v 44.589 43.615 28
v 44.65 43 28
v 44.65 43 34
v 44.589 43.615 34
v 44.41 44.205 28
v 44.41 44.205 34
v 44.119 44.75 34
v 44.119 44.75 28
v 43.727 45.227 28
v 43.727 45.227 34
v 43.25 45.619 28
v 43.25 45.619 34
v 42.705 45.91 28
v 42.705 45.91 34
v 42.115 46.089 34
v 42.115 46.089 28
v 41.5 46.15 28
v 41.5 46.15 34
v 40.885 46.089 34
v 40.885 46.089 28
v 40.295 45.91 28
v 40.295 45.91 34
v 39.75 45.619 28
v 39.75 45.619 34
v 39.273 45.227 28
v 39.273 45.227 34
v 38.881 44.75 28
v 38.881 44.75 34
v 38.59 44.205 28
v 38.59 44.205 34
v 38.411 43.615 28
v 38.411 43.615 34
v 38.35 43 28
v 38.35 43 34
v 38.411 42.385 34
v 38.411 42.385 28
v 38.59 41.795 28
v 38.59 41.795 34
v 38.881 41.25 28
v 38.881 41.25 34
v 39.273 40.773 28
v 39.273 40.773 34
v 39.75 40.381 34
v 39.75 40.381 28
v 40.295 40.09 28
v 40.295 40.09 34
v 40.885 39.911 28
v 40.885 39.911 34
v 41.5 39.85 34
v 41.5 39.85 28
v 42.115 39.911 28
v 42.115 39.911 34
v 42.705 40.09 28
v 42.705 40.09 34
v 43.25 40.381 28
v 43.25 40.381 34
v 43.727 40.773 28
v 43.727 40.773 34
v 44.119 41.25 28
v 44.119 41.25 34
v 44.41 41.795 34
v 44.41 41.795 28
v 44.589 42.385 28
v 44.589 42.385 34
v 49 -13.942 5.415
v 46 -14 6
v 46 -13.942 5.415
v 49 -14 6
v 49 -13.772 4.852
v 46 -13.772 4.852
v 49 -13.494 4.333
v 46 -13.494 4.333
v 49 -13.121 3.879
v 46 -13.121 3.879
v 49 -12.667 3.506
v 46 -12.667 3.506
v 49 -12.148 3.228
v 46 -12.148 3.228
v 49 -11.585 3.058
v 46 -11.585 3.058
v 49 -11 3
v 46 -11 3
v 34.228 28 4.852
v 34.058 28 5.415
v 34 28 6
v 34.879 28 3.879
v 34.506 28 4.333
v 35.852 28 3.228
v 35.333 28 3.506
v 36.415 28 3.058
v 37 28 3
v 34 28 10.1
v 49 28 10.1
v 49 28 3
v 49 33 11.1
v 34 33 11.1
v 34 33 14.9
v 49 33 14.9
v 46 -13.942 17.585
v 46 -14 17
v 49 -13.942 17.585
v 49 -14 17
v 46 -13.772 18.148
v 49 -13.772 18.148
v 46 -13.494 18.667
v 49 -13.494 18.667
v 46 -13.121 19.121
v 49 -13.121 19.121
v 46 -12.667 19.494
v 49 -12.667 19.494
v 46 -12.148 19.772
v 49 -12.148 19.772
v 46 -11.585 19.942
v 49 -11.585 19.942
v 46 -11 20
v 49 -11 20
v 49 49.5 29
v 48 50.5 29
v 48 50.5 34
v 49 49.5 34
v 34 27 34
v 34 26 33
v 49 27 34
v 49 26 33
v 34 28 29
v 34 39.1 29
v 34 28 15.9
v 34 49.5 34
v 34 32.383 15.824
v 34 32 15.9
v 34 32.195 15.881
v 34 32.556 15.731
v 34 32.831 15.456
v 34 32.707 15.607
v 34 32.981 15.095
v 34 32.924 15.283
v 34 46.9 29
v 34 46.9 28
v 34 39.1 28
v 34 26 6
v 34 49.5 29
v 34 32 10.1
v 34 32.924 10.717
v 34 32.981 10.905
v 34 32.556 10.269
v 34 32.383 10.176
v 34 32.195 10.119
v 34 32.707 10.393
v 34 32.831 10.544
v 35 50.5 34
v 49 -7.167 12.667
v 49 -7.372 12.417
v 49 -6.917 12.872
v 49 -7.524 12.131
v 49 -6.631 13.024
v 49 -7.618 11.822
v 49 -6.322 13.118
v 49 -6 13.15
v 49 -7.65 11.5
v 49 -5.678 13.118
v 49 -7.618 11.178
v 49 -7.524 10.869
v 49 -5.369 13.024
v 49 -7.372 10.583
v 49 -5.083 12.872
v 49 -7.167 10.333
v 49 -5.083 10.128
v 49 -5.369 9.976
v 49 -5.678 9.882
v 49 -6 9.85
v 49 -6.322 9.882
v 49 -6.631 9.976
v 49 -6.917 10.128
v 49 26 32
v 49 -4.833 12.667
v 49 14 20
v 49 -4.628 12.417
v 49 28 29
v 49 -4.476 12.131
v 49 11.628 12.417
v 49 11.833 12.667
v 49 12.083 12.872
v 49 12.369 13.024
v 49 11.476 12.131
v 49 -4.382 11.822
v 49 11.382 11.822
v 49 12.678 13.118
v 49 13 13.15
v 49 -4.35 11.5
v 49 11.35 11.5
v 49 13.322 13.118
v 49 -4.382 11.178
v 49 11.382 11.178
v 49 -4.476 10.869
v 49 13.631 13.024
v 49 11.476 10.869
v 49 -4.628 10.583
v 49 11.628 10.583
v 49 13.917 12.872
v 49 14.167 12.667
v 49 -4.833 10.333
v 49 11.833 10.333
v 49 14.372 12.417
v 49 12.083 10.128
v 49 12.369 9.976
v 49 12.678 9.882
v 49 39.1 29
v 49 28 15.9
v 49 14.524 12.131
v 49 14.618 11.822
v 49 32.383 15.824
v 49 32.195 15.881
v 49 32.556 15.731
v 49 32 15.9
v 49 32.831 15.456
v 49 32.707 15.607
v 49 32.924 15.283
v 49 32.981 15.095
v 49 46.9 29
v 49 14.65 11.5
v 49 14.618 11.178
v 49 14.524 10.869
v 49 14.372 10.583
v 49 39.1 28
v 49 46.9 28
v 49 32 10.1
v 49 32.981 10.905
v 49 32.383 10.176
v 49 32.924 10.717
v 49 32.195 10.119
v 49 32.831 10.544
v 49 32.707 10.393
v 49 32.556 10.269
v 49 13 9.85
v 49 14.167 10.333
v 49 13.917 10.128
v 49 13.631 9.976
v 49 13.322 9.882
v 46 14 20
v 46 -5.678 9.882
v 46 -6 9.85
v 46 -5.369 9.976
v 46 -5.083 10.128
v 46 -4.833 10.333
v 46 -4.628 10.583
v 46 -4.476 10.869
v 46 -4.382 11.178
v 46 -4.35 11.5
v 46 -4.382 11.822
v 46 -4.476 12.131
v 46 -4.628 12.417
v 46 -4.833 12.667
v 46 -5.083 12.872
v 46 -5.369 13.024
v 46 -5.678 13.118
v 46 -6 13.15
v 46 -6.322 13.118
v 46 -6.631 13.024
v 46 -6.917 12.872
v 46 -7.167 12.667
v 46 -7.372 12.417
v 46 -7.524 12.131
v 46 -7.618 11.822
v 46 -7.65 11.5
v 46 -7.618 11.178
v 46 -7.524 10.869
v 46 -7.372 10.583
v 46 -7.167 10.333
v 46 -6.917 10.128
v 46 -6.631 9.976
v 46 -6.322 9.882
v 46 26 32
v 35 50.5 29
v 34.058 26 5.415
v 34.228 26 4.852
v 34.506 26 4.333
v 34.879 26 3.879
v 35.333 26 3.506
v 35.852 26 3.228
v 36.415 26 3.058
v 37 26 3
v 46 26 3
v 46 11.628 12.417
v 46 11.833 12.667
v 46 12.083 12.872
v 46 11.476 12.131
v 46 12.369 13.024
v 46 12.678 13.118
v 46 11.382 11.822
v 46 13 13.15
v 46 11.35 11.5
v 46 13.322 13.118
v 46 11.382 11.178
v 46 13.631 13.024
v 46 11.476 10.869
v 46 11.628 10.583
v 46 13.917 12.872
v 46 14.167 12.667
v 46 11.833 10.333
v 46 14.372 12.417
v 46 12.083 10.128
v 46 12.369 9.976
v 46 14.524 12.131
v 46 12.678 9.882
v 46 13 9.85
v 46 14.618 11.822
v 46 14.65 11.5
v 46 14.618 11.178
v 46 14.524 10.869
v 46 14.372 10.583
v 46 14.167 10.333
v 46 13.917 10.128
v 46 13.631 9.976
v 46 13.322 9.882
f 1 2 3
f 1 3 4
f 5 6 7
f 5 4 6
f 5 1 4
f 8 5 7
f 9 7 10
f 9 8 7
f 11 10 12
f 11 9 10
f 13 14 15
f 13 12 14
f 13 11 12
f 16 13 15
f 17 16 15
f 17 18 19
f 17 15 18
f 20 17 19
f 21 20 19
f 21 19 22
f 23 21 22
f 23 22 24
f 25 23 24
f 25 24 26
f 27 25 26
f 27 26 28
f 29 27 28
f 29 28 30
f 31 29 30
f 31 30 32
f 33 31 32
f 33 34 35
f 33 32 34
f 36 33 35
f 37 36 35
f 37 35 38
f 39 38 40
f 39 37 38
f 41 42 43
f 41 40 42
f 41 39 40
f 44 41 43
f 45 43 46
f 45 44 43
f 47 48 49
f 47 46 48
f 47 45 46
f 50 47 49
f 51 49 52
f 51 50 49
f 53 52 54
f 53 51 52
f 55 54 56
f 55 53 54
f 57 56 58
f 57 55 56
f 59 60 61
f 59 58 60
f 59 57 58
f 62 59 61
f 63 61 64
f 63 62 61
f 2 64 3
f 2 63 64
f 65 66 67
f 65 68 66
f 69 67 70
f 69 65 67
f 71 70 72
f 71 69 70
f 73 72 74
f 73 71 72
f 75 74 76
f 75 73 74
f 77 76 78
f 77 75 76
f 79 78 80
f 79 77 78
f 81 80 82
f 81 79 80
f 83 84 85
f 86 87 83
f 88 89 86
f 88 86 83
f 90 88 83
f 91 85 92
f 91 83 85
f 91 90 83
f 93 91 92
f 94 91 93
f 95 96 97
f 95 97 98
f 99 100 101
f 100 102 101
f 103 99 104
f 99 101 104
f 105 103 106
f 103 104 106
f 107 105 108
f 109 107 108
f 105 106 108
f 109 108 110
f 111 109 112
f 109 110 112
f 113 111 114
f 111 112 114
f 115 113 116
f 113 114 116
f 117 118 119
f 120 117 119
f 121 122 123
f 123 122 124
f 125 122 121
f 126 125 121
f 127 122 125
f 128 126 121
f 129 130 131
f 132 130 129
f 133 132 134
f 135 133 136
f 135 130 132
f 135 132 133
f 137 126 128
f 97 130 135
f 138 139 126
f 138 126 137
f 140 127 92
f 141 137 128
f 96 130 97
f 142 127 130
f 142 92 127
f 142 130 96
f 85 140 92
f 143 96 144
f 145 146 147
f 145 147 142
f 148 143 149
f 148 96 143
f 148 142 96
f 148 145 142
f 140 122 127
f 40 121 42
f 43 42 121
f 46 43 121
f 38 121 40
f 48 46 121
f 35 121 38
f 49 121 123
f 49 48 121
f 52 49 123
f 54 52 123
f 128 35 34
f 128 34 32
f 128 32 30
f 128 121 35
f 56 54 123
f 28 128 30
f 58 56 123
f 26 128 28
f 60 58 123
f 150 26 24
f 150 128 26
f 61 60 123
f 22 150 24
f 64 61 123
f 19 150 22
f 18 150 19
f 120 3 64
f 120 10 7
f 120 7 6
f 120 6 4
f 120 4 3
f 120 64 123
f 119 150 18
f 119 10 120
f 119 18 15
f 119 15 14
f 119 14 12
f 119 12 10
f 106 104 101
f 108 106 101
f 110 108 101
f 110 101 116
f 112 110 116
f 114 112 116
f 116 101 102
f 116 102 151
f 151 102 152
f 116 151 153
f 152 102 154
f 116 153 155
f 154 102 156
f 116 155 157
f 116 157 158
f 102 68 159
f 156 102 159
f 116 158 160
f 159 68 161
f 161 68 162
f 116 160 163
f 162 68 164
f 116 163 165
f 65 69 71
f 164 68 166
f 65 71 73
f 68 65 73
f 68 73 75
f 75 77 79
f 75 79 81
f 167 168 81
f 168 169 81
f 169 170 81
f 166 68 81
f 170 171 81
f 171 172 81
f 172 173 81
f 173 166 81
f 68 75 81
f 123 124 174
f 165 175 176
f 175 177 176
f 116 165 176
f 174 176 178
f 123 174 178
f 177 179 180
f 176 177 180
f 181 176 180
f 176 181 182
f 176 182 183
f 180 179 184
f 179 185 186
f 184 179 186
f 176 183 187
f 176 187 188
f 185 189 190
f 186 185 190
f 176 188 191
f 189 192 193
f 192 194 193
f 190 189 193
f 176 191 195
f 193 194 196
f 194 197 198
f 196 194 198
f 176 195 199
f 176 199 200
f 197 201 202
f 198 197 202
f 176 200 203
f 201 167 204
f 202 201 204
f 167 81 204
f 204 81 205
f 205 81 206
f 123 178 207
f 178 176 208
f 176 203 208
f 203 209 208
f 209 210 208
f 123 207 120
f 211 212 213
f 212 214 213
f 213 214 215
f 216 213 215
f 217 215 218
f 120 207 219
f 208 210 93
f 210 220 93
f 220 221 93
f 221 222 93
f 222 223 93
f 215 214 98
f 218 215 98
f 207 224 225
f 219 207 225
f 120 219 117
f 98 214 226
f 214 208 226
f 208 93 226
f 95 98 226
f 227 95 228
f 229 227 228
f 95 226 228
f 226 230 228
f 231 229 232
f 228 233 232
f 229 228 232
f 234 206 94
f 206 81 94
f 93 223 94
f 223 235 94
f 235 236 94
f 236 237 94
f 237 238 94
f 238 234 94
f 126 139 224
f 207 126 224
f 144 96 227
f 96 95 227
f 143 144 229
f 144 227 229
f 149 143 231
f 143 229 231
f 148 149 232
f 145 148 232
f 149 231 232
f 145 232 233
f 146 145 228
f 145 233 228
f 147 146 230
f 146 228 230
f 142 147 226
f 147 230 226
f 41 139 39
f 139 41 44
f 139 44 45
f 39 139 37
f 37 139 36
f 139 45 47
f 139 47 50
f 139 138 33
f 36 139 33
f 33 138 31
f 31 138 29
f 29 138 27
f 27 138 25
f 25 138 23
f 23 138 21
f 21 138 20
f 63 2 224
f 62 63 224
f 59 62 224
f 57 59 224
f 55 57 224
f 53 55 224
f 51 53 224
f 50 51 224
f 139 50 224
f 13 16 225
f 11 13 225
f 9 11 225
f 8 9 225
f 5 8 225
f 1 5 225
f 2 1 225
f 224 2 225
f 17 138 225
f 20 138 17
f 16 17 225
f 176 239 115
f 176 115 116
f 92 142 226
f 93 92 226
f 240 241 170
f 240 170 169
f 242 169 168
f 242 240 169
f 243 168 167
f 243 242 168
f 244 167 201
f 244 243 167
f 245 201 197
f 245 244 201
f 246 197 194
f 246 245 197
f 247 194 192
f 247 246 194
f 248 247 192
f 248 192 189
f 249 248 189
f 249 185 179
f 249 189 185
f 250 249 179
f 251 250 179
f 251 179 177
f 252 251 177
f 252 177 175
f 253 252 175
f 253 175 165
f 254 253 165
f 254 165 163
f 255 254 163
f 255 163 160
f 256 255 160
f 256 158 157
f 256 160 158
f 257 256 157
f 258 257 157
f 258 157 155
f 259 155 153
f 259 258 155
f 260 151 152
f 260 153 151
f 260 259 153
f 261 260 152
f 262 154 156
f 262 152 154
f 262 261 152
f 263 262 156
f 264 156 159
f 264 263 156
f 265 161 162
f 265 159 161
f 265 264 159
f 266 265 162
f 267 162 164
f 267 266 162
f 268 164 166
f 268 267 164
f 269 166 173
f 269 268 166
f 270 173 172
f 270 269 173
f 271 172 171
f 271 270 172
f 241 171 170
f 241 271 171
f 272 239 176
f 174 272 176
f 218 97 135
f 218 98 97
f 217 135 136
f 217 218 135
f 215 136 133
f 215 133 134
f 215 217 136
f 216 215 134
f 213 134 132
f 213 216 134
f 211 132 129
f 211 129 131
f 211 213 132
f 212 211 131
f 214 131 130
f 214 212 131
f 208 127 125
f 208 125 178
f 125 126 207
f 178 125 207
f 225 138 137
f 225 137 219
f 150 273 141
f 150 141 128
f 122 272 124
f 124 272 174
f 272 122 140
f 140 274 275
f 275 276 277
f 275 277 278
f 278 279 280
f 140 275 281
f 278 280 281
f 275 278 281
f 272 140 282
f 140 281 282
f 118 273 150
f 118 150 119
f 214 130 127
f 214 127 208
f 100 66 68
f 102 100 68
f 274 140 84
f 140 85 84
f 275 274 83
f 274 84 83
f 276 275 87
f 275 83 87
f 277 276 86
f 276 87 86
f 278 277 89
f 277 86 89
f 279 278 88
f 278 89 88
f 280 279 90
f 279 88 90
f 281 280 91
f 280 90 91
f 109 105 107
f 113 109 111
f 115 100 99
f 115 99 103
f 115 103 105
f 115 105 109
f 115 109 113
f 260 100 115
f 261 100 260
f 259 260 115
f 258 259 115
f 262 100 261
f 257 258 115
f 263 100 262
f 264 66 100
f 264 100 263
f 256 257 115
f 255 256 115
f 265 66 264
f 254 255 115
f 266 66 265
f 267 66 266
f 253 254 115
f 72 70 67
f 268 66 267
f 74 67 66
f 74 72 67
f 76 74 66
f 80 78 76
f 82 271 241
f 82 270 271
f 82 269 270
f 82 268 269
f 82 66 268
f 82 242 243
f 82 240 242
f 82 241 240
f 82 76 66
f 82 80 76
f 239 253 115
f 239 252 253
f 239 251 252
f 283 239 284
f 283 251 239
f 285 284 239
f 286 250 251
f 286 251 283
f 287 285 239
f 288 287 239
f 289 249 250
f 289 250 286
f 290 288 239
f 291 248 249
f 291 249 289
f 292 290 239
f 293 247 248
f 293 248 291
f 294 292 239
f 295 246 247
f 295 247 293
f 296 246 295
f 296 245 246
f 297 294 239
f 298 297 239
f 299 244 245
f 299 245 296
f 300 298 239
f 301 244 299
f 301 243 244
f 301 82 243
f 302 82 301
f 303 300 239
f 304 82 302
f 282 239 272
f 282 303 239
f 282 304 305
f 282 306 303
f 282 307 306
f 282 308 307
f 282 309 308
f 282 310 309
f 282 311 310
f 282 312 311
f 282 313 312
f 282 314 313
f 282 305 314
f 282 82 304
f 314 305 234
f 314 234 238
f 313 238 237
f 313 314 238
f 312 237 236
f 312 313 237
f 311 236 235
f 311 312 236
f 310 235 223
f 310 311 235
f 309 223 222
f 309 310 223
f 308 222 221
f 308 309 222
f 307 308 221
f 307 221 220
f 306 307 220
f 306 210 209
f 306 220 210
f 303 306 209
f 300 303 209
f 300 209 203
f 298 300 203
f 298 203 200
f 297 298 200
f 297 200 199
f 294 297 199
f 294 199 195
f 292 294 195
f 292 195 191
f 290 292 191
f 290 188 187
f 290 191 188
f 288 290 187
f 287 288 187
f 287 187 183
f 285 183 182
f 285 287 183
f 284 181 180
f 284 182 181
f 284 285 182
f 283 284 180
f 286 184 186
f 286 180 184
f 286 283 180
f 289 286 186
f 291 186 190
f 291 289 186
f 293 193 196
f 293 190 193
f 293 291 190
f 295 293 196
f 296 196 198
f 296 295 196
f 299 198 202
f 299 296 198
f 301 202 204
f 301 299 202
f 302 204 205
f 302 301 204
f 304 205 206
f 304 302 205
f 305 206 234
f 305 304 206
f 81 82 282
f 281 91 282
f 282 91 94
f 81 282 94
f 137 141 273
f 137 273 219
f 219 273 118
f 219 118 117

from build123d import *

# Parameters (mm, degrees)
BOX055_W           = 15
BOX055_H           = 2
BOX055_DEPTH       = 26
FILLET005015025_R  = 3
BOX058_W           = 15
BOX058_H           = 6
BOX058_DEPTH       = 5.8
FILLET005015028_R  = 1
CYLINDER021_R      = 3.15
CYLINDER021_DEPTH  = 10
BOX054_W           = 15
BOX054_H           = 24.5
BOX054_DEPTH       = 5
CHAMFER010013_SIZE = 1
BOX057_W           = 15
BOX057_H           = 7.8
BOX057_DEPTH       = 2
CYLINDER023_R      = 1.65
CYLINDER023_DEPTH  = 14
CYLINDER022_R      = 1.65
CYLINDER022_DEPTH  = 14
BOX056_W           = 3
BOX056_H           = 40
BOX056_DEPTH       = 17
FILLET005015024_R  = 3
CHAMFER010014_SIZE = 12
CHAMFER010015_SIZE = 1


with BuildPart() as fillet005015025:
    # Box055 → Box055 (new body)
    with BuildSketch(Plane(origin=(34, 26, 3), x_dir=(1, 0, 0), z_dir=(0, 0, 1))):
        with Locations((7.5, 1)):
            Rectangle(BOX055_W, BOX055_H)
    extrude(amount=BOX055_DEPTH)

    # Fillet005015025
    fillet005015025_edges = [fillet005015025.edges().sort_by_distance(p)[0] for p in [
        (34, 27, 3),
    ]]
    fillet(fillet005015025_edges, radius=FILLET005015025_R)


with BuildPart() as fillet005015028:
    # Box058 → Box058 (new body)
    with BuildSketch(Plane(origin=(34, 27, 10.1), x_dir=(1, 0, 0), z_dir=(0, 0, 1))):
        with Locations((7.5, 3)):
            Rectangle(BOX058_W, BOX058_H)
    extrude(amount=BOX058_DEPTH)

    # Fillet005015028
    fillet005015028_edges = [fillet005015028.edges().sort_by_distance(p)[0] for p in [
        (41.5, 33, 10.1),
        (41.5, 33, 15.9),
    ]]
    fillet(fillet005015028_edges, radius=FILLET005015028_R)


with BuildPart() as cylinder021:
    # Cylinder021 → Cylinder021 (new body)
    with BuildSketch(Plane(origin=(41.5, 43, 25), x_dir=(1, 0, 0), z_dir=(0, 0, 1))):
        Circle(CYLINDER021_R)
    extrude(amount=CYLINDER021_DEPTH)


with BuildPart() as chamfer010013:
    # Box054 → Box054 (new body)
    with BuildSketch(Plane(origin=(34, 26, 29), x_dir=(1, 0, 0), z_dir=(0, 0, 1))):
        with Locations((7.5, 12.25)):
            Rectangle(BOX054_W, BOX054_H)
    extrude(amount=BOX054_DEPTH)

    # Chamfer010013
    chamfer010013_edges = [chamfer010013.edges().sort_by_distance(p)[0] for p in [
        (34, 50.5, 31.5),
        (49, 50.5, 31.5),
    ]]
    chamfer(chamfer010013_edges, length=CHAMFER010013_SIZE)


with BuildPart() as cut019003006:
    # Box057 → Box057 (new body)
    with BuildSketch(Plane(origin=(34, 39.1, 28), x_dir=(1, 0, 0), z_dir=(0, 0, 1))):
        with Locations((7.5, 3.9)):
            Rectangle(BOX057_W, BOX057_H)
    extrude(amount=BOX057_DEPTH)

    # Fusion001021004009015012: union Chamfer010013
    add(chamfer010013.part)

    # Cut019003006: cut Cylinder021
    add(cylinder021.part, mode=Mode.SUBTRACT)


with BuildPart() as cylinder023:
    # Cylinder023 → Cylinder023 (new body)
    with BuildSketch(Plane(origin=(37, 13, 11.5), x_dir=(0, 0, -1), z_dir=(1, 0, 0))):
        Circle(CYLINDER023_R)
    extrude(amount=CYLINDER023_DEPTH)


with BuildPart() as fusion001021004009015011:
    # Cylinder022 → Cylinder022 (new body)
    with BuildSketch(Plane(origin=(37, -6, 11.5), x_dir=(0, 0, -1), z_dir=(1, 0, 0))):
        Circle(CYLINDER022_R)
    extrude(amount=CYLINDER022_DEPTH)

    # Fusion001021004009015011: union Cylinder023
    add(cylinder023.part)


with BuildPart() as top_mount_arm_right:
    # Box056 → Box056 (new body)
    with BuildSketch(Plane(origin=(46, -14, 3), x_dir=(1, 0, 0), z_dir=(0, 0, 1))):
        with Locations((1.5, 20)):
            Rectangle(BOX056_W, BOX056_H)
    extrude(amount=BOX056_DEPTH)

    # Fillet005015024
    fillet005015024_edges = [top_mount_arm_right.edges().sort_by_distance(p)[0] for p in [
        (47.5, -14, 3),
        (47.5, -14, 20),
    ]]
    fillet(fillet005015024_edges, radius=FILLET005015024_R)

    # Cut019003007: cut Fusion001021004009015011
    add(fusion001021004009015011.part, mode=Mode.SUBTRACT)

    # Fusion001021004009015013: union Fillet005015025, Fillet005015028, Cut019003006
    add(fillet005015025.part)
    add(fillet005015028.part)
    add(cut019003006.part)

    # Chamfer010014
    chamfer010014_edges = [top_mount_arm_right.edges().sort_by_distance(p)[0] for p in [
        (47.5, 26, 20),
    ]]
    chamfer(chamfer010014_edges, length=CHAMFER010014_SIZE)

    # Chamfer010015
    chamfer010015_edges = [top_mount_arm_right.edges().sort_by_distance(p)[0] for p in [
        (41.5, 26, 34),
    ]]
    chamfer(chamfer010015_edges, length=CHAMFER010015_SIZE)


solid = top_mount_arm_right.part
